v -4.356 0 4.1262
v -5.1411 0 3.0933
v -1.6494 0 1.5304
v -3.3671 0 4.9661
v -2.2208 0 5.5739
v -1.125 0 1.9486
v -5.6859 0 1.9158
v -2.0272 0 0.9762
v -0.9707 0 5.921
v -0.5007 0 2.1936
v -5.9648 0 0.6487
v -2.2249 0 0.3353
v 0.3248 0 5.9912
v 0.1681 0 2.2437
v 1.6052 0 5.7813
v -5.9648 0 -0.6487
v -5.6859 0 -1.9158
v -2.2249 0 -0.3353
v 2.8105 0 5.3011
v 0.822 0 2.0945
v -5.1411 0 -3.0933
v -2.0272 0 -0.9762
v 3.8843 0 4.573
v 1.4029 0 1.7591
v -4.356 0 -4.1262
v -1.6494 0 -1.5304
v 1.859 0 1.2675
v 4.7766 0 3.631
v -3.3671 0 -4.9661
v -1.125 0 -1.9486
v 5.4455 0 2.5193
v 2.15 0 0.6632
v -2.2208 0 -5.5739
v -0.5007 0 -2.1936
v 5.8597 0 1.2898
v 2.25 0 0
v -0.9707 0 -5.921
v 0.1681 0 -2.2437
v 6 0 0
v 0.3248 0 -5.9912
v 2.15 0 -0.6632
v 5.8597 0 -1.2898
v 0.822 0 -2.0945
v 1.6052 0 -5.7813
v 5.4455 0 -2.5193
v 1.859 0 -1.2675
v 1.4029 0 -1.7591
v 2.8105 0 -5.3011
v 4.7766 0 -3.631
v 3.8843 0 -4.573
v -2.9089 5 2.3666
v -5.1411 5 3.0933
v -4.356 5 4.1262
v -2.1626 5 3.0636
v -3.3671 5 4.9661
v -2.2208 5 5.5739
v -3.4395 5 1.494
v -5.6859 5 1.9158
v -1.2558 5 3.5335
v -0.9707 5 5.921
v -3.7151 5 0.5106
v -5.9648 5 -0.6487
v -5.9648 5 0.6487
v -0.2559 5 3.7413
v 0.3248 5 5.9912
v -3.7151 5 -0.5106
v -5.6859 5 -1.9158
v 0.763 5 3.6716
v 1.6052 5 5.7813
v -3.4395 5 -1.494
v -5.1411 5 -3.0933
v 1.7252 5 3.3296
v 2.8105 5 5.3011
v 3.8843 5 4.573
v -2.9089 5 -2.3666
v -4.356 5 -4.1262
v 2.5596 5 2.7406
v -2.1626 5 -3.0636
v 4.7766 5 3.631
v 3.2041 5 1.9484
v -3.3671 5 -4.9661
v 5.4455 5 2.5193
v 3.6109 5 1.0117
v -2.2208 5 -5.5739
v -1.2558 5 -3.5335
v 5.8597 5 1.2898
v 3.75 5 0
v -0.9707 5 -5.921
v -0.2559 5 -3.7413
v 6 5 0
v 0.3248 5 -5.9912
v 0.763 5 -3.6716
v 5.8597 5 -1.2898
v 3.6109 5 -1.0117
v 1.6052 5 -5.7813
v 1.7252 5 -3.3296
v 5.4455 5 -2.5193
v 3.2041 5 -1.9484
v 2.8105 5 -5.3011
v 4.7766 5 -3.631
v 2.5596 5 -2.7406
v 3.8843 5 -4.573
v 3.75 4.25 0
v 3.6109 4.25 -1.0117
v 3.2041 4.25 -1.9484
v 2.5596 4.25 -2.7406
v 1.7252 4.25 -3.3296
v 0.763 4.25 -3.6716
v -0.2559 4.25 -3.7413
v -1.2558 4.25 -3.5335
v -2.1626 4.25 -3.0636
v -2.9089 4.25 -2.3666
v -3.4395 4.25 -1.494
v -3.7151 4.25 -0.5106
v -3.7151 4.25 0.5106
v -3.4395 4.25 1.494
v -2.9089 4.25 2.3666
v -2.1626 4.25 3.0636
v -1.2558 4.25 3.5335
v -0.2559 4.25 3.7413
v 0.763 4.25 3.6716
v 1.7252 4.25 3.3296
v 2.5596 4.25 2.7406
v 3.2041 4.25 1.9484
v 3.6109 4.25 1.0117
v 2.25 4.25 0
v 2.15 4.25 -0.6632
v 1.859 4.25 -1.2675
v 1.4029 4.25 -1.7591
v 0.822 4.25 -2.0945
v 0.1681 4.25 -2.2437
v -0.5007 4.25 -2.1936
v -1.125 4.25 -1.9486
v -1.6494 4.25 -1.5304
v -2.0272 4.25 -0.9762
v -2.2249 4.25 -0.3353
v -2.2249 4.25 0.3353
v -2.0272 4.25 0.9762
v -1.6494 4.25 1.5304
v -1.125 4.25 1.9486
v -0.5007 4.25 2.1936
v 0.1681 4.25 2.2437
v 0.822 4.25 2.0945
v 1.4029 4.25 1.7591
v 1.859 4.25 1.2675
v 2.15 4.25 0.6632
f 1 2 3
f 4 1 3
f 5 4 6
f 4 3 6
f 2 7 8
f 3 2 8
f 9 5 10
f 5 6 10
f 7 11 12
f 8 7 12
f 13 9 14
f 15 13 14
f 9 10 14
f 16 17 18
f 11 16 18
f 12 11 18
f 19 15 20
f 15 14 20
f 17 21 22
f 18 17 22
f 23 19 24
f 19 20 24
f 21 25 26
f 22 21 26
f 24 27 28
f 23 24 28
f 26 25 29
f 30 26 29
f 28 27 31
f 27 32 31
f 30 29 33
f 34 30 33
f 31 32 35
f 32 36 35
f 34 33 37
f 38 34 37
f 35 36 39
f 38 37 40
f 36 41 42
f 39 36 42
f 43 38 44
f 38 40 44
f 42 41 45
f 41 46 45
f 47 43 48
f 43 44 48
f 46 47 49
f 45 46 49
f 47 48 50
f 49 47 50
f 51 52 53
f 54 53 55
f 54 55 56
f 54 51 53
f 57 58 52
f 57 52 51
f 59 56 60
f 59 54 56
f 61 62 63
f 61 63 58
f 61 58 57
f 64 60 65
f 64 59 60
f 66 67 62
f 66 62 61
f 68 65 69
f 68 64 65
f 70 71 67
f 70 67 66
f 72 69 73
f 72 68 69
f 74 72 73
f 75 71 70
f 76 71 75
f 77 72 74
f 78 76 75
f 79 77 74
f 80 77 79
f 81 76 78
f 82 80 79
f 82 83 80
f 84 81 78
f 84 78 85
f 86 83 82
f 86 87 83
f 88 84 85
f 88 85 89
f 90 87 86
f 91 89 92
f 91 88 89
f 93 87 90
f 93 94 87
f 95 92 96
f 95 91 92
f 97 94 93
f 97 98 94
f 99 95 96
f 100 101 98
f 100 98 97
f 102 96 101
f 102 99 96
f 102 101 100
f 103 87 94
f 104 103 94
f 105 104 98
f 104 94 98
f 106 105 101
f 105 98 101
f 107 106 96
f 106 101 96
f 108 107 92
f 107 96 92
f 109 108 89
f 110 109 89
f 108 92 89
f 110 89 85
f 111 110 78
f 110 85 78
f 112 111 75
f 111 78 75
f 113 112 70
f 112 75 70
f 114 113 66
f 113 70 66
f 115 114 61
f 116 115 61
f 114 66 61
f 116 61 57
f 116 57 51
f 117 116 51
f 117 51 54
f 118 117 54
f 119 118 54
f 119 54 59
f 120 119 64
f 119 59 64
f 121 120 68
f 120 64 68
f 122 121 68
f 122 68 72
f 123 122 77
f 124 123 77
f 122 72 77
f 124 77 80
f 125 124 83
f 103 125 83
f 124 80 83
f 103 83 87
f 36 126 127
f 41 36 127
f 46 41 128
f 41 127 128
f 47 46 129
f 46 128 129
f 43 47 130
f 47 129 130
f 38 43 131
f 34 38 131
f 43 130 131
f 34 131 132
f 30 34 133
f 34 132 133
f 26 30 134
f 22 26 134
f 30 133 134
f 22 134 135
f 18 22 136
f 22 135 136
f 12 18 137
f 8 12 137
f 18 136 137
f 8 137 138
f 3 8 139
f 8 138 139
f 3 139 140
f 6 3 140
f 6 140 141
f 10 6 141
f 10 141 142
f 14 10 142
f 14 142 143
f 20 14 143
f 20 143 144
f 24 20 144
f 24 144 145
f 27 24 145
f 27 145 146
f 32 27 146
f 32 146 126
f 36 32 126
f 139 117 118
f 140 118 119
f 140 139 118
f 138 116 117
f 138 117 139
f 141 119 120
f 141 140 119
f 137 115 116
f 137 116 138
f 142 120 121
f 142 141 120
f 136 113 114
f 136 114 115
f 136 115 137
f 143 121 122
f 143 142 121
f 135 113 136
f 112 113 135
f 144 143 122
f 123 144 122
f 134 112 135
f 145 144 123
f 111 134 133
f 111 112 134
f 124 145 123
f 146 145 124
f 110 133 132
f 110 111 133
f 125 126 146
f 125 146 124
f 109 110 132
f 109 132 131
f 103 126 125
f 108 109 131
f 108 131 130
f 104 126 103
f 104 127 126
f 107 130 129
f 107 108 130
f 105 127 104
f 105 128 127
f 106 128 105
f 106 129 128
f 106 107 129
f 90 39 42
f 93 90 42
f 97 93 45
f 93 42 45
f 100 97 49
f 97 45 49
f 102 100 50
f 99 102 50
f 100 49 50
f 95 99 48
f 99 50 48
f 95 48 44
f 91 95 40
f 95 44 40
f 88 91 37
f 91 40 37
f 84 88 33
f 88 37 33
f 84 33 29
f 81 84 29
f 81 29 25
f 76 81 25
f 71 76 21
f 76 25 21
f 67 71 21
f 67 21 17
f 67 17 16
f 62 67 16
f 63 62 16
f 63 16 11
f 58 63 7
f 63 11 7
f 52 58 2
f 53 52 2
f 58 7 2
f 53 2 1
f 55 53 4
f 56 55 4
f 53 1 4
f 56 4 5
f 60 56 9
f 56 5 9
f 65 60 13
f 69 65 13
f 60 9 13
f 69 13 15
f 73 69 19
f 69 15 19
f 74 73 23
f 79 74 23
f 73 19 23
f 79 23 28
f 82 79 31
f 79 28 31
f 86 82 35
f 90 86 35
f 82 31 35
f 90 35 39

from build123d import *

# Parameters (mm, degrees)
ESQUISSE1_R             = 6
BOSS_EXTRU_1_DEPTH      = 5
ENL_V_MAT_EXTRU_1_REACH = 7
ESQUISSE2_R             = 2.25
ESQUISSE3_R             = 3.75
ENL_V_MAT_EXTRU_2_DEPTH = 0.75


with BuildPart() as part:
    # Esquisse1 → Boss.-Extru.1 (new body)
    with BuildSketch(Plane(origin=(0, 0, 0), x_dir=(1, 0, 0), z_dir=(0, 1, 0))):
        Circle(ESQUISSE1_R)
    extrude(amount=BOSS_EXTRU_1_DEPTH)

    # Esquisse2 → Enlèv. mat.-Extru.1 (cut, up to next)
    with BuildSketch(Plane(origin=(0, 5, 0), x_dir=(1, 0, 0), z_dir=(0, 1, 0)), mode=Mode.PRIVATE) as enl_v_mat_extru_1_sk1:
        Circle(ESQUISSE2_R)
    enl_v_mat_extru_1_tool1 = extrude(enl_v_mat_extru_1_sk1.sketch, amount=-ENL_V_MAT_EXTRU_1_REACH, mode=Mode.PRIVATE) & part.part
    add(enl_v_mat_extru_1_tool1.solids().sort_by_distance((0, 5, 0))[0], mode=Mode.SUBTRACT)

    # Esquisse3 → Enlèv. mat.-Extru.2 (cut)
    with BuildSketch(Plane(origin=(0, 5, 0), x_dir=(1, 0, 0), z_dir=(0, 1, 0))):
        Circle(ESQUISSE3_R)
    extrude(amount=-ENL_V_MAT_EXTRU_2_DEPTH, mode=Mode.SUBTRACT)


solid = part.part
